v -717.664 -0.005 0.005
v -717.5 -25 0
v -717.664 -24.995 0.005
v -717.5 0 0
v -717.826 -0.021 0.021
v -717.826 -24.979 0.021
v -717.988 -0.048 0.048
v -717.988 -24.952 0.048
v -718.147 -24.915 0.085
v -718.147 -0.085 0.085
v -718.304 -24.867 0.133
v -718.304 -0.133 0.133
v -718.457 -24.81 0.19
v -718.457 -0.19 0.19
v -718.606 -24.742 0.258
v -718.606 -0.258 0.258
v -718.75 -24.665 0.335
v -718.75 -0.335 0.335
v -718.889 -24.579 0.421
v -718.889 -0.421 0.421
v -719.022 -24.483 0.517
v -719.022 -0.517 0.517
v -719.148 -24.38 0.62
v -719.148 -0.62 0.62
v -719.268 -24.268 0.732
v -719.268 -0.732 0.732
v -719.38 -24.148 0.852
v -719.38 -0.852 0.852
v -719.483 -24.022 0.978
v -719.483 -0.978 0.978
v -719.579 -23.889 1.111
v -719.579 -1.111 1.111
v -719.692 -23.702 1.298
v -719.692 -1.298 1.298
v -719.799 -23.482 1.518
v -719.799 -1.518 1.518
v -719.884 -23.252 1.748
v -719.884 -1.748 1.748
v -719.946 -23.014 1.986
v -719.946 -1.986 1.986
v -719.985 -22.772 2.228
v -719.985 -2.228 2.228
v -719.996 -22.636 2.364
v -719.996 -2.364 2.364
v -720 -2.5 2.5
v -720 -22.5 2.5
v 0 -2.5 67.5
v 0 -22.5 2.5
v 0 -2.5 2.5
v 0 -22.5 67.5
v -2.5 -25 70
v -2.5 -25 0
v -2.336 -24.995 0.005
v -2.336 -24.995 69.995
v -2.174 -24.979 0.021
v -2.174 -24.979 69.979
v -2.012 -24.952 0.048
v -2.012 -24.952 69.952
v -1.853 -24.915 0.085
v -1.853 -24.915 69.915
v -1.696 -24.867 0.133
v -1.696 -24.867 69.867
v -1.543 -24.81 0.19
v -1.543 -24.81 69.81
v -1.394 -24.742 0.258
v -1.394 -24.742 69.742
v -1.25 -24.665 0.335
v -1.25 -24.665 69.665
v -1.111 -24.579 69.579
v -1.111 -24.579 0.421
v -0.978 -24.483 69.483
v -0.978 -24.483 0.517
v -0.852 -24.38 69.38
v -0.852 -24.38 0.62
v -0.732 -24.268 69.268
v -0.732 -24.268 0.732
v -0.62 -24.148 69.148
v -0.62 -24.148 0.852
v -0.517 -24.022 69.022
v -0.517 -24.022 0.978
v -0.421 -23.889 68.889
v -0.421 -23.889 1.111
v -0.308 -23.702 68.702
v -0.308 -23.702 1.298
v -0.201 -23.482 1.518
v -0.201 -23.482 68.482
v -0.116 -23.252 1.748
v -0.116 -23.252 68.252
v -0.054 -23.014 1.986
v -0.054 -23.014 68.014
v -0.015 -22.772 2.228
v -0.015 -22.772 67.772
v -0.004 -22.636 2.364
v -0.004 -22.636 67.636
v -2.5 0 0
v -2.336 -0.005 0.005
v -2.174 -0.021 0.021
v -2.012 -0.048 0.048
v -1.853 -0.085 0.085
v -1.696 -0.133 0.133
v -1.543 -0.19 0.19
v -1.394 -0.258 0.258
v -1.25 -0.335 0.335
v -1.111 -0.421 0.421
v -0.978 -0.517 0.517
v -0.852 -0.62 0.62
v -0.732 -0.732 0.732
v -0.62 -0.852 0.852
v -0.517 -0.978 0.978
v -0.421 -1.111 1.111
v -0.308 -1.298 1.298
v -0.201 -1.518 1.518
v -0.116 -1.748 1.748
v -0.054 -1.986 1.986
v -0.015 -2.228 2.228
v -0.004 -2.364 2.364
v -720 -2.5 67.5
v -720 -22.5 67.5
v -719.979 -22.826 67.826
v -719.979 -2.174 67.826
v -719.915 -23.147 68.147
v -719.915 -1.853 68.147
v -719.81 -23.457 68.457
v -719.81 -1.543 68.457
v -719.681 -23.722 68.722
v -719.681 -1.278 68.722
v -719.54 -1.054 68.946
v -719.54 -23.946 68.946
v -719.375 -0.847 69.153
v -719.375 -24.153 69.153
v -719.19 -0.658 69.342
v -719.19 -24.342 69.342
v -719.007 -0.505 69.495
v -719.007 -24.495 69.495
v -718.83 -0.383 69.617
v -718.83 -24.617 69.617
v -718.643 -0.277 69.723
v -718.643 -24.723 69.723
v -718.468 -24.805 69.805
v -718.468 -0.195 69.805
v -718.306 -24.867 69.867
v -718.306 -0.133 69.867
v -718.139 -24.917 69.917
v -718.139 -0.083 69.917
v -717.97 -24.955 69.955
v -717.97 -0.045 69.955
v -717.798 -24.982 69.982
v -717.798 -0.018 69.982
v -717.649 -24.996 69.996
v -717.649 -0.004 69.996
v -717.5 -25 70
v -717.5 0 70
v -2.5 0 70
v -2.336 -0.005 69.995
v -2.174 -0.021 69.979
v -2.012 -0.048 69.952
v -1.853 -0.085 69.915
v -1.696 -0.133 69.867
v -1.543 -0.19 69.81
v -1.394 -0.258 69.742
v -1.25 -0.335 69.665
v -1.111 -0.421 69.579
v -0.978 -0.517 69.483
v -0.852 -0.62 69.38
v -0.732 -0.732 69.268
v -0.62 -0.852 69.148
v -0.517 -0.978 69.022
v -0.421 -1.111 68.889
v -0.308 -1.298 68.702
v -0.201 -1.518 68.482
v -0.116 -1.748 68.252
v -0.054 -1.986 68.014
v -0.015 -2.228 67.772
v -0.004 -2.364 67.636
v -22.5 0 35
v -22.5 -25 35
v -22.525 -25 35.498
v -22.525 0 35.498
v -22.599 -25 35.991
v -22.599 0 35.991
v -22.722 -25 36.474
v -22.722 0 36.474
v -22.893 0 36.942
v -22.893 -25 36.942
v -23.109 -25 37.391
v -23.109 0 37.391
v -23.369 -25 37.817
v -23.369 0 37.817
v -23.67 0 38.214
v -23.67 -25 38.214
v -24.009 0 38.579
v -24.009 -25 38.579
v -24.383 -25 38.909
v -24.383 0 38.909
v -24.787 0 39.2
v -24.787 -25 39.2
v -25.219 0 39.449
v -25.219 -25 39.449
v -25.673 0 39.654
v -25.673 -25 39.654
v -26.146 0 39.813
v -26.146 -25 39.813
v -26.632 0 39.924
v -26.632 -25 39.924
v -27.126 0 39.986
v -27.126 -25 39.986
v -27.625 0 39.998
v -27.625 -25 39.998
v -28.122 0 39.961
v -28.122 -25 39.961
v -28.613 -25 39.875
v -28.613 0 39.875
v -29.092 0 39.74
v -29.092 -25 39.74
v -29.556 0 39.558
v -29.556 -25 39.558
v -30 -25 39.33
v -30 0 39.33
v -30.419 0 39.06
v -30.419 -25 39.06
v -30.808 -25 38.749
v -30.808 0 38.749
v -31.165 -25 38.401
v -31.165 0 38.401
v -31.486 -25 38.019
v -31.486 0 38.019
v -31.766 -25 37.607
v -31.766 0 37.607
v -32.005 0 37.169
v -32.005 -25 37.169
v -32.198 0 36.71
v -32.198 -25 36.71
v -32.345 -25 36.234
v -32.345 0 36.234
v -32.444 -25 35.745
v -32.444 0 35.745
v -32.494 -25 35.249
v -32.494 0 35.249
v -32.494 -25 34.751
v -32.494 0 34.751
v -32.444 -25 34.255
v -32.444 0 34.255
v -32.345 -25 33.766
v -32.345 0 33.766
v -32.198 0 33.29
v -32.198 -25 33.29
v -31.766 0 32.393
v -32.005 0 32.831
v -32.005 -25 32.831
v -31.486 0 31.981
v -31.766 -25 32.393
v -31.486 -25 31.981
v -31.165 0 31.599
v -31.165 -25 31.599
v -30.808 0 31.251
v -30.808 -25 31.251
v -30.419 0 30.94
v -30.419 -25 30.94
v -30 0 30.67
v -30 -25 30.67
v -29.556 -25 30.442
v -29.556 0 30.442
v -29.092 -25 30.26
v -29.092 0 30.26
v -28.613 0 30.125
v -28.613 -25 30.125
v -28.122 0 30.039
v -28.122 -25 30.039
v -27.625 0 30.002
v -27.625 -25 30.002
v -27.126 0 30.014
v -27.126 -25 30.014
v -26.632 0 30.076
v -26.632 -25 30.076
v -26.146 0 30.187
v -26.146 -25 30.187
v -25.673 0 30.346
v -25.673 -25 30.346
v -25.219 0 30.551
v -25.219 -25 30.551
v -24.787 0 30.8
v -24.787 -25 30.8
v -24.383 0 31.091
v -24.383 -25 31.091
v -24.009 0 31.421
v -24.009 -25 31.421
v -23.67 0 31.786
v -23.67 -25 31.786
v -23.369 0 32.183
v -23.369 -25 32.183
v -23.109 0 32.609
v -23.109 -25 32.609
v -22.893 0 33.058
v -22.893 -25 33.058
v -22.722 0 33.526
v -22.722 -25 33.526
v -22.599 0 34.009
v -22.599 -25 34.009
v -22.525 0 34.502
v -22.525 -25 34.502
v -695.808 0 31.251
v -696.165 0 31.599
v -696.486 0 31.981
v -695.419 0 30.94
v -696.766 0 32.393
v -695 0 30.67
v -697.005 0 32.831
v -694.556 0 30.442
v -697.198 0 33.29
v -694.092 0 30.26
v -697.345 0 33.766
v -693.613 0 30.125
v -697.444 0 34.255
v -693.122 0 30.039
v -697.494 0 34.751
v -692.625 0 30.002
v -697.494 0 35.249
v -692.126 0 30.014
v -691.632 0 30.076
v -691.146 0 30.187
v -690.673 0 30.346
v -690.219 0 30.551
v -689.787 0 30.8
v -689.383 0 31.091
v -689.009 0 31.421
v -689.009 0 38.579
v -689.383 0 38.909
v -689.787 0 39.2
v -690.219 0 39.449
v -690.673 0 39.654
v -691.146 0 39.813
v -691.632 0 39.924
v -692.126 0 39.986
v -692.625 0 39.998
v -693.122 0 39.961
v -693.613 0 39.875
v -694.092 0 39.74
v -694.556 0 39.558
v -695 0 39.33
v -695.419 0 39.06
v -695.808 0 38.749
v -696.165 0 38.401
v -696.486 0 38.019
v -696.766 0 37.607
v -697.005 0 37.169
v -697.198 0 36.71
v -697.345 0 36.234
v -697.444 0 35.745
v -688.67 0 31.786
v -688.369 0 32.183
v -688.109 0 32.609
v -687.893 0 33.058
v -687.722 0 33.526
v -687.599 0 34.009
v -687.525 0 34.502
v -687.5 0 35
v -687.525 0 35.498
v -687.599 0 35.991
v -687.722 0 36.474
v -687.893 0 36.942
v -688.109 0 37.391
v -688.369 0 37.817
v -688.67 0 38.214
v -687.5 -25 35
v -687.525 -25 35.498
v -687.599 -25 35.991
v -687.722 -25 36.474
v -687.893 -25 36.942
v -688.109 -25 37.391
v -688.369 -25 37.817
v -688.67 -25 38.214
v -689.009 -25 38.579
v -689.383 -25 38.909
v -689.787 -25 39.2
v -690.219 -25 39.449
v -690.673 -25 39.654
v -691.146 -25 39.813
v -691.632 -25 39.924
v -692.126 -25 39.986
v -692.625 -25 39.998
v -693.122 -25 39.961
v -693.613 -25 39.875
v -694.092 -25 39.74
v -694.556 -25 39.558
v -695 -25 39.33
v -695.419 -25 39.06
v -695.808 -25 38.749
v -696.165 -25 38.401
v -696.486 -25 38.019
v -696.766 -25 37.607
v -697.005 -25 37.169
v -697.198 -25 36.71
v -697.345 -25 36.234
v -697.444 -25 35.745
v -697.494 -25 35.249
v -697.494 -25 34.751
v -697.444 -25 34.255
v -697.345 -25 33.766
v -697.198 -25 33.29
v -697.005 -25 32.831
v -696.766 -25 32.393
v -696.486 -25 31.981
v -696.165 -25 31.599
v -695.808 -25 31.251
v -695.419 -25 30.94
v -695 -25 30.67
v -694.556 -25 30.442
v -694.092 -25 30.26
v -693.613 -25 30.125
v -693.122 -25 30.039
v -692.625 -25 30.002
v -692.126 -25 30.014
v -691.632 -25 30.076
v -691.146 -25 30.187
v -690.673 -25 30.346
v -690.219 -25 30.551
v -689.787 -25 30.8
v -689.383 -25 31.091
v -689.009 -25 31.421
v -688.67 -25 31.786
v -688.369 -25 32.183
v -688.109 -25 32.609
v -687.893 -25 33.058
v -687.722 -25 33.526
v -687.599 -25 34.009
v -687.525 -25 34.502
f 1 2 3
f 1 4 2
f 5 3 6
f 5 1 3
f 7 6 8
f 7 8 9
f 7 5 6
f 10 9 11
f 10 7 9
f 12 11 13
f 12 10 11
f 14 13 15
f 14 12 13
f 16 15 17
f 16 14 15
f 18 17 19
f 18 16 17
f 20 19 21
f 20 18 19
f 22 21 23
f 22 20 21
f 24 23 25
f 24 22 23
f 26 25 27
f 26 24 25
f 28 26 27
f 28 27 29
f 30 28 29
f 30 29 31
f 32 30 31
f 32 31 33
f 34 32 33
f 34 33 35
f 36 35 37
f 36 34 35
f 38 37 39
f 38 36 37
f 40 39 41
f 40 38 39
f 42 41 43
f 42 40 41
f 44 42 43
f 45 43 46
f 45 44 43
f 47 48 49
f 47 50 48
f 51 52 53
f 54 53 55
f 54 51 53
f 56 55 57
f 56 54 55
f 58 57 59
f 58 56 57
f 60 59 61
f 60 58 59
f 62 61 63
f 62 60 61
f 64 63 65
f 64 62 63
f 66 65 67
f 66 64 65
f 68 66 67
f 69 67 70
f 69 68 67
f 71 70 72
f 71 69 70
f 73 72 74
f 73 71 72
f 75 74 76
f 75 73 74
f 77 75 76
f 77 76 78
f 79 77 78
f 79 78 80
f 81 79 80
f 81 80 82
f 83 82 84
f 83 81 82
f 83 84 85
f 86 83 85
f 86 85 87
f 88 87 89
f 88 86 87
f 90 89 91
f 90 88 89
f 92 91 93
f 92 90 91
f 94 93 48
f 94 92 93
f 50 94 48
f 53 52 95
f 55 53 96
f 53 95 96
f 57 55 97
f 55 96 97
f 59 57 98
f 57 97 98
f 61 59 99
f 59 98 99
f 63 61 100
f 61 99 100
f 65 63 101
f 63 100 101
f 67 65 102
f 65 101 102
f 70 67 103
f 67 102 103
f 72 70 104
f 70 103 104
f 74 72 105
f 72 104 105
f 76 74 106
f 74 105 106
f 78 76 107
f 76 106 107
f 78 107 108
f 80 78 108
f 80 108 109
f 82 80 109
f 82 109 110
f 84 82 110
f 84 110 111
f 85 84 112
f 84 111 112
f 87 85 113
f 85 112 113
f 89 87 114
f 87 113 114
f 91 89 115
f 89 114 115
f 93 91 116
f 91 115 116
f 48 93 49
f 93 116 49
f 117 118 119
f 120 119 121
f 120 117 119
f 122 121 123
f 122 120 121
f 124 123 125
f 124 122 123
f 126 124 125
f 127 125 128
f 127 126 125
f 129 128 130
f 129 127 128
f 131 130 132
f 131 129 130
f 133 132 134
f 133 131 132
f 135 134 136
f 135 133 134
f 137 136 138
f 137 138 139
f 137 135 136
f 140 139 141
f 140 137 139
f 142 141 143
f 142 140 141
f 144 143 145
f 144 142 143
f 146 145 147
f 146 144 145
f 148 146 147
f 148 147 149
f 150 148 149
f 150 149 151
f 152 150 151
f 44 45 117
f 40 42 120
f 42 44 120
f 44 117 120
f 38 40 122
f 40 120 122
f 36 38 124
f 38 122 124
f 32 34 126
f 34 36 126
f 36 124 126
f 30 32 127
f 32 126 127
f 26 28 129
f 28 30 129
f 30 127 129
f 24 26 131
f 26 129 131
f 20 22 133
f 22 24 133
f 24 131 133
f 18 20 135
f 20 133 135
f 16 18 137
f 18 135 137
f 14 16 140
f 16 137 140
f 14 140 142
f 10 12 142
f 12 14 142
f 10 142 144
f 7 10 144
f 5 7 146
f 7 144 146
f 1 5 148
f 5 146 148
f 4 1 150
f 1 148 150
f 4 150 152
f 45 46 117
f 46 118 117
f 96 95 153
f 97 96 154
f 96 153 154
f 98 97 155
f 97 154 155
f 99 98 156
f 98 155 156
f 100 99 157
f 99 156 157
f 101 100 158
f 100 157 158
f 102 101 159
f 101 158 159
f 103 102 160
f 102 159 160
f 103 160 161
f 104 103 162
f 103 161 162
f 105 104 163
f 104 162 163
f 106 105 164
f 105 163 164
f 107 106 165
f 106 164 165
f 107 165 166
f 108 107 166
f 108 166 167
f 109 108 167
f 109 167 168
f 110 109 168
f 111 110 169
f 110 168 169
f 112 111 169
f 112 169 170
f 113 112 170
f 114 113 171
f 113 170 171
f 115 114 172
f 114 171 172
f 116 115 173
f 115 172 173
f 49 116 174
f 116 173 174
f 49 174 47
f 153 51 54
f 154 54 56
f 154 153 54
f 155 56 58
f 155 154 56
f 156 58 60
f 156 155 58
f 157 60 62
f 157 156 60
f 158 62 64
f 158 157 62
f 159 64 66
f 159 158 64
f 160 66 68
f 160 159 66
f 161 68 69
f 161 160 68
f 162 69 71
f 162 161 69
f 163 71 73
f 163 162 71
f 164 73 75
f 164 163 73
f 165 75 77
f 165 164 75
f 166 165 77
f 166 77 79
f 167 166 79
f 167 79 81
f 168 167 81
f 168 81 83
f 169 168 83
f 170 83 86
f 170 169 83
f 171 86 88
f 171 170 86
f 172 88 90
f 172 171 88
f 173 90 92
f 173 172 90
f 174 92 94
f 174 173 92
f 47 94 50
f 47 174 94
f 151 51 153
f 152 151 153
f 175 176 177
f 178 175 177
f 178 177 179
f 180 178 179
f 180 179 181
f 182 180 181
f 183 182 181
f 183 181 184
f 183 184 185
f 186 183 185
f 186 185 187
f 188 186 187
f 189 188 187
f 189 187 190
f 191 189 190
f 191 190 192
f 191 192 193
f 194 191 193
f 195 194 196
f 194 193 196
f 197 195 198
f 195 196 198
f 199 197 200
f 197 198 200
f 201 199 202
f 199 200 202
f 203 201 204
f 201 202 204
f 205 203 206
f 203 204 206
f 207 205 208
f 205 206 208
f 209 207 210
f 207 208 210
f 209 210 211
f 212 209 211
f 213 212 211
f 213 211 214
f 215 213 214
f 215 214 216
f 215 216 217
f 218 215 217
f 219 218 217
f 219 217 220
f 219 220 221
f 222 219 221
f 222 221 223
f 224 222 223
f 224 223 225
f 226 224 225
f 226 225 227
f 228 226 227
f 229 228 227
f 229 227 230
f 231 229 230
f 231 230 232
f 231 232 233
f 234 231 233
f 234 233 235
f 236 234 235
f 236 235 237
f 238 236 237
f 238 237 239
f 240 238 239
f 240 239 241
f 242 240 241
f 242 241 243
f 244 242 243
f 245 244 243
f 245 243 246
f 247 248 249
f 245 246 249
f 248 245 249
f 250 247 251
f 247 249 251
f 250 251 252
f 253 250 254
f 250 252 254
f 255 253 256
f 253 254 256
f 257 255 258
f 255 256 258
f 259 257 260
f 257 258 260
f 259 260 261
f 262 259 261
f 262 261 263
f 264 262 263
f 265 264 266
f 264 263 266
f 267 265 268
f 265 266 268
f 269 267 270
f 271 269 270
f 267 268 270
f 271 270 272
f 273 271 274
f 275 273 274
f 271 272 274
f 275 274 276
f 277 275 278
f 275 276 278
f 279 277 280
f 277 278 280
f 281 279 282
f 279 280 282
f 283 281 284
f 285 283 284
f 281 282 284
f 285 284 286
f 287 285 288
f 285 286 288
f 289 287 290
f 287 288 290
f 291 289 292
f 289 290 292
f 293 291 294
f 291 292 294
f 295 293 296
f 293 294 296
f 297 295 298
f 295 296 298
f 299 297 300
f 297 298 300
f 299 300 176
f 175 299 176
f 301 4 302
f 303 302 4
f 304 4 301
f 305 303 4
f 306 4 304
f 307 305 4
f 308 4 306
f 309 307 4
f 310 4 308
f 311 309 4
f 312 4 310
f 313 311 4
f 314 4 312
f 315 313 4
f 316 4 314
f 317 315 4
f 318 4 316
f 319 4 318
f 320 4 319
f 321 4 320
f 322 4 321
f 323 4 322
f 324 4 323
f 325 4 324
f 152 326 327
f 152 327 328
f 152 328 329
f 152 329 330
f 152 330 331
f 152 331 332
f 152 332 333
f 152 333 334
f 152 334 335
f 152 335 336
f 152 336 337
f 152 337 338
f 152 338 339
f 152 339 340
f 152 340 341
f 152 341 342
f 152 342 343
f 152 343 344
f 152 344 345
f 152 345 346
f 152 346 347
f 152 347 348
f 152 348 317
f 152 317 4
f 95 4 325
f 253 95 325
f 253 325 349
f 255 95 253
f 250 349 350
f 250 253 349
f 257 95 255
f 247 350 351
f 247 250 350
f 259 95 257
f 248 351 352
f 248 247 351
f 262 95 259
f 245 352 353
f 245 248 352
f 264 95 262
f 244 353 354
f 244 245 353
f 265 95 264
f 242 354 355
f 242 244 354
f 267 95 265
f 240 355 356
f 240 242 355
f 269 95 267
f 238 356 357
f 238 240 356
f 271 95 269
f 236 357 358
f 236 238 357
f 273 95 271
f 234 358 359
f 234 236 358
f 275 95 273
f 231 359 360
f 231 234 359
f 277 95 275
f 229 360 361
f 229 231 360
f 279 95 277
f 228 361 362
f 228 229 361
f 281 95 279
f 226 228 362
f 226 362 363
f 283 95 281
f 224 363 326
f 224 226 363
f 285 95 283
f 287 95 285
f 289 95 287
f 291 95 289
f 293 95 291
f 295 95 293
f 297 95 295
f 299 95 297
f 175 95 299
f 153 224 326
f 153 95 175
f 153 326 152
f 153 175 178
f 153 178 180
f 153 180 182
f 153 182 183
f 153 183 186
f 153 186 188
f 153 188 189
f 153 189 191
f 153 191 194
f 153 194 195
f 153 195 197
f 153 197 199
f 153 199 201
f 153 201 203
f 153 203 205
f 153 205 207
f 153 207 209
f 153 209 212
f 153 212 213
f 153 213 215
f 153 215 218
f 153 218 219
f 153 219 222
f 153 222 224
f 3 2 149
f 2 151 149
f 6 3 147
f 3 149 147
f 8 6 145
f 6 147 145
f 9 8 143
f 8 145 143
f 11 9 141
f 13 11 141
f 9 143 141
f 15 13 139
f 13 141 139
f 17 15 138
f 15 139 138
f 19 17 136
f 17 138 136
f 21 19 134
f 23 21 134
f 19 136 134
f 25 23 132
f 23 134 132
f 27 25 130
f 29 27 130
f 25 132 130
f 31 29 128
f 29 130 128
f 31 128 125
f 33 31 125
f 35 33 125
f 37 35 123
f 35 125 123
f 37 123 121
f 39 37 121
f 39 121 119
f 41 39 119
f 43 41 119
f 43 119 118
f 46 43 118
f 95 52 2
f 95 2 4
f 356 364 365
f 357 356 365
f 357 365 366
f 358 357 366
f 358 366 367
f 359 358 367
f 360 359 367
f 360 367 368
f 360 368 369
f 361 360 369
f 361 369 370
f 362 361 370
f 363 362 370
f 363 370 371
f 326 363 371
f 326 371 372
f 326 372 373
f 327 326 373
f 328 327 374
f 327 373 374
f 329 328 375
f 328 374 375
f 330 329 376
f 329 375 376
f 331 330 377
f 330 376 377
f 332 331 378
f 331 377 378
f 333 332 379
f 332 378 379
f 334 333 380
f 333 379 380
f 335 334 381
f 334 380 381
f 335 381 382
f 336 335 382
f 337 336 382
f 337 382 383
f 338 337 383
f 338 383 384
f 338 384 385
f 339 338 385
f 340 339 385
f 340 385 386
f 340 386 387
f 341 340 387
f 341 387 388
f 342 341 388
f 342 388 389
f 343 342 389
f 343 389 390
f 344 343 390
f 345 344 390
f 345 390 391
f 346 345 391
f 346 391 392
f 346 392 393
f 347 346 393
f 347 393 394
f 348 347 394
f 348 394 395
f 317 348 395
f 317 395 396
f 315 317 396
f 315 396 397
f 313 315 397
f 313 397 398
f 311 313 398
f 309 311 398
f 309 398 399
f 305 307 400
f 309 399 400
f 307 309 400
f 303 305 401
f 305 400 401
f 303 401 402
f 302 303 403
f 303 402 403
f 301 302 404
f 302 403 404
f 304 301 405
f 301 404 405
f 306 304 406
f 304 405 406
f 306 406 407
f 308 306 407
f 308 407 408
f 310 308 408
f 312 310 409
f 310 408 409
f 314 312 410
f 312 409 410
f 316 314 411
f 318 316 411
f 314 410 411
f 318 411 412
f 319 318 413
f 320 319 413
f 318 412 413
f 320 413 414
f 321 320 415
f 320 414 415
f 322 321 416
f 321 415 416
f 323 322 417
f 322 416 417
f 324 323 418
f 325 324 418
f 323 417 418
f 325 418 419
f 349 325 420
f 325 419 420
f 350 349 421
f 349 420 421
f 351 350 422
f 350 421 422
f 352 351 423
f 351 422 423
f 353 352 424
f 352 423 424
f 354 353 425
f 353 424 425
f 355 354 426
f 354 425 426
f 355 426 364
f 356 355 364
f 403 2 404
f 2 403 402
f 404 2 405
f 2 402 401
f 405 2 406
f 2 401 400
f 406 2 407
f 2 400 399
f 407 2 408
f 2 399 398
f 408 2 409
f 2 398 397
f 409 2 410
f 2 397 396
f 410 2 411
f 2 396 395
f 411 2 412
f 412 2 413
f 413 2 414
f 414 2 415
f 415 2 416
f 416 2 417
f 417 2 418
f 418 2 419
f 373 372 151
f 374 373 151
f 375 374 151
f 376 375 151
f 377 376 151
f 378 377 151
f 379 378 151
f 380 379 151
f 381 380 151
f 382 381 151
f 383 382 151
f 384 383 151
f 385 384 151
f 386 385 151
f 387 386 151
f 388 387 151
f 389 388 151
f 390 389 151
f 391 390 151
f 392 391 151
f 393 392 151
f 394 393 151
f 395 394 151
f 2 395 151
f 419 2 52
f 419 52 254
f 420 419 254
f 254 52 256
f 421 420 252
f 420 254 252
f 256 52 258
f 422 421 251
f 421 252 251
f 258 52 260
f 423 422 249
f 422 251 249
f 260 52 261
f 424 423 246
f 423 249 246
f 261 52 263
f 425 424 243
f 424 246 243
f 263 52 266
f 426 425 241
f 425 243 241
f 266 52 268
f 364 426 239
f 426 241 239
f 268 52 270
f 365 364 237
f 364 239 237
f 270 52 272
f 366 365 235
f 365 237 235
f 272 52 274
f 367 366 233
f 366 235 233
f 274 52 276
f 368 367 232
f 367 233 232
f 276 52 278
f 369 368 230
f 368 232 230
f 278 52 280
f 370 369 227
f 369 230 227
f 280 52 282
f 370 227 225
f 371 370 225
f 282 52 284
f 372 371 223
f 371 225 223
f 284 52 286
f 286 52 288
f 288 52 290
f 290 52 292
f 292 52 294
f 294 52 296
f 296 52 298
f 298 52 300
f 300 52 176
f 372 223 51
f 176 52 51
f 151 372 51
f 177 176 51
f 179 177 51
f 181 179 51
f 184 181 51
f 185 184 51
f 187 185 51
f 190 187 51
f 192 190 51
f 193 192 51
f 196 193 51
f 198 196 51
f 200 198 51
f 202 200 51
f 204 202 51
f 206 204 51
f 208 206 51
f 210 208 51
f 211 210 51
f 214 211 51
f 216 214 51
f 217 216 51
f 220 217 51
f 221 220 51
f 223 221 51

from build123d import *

# Parameters (mm, degrees)
F0_W     = 25
F0_H     = 70
F1_DEPTH = 720
F2_R     = 2.5
F3_R     = 2.5
F4_R     = 5
F5_DEPTH = 25.001


with BuildPart() as f1:
    # F0 (on Right) → F1 (new body)
    with BuildSketch(Plane.YZ):
        with Locations((-12.5, 35)):
            Rectangle(F0_W, F0_H)
    extrude(amount=-F1_DEPTH)

    # F2
    f2_edges = [f1.edges().sort_by_distance(p)[0] for p in [
        (0, -12.5, 0),
        (0, 0, 35),
        (0, -12.5, 70),
        (0, -25, 35),
    ]]
    fillet(f2_edges, radius=F2_R)

    # F3
    f3_edges = [f1.edges().sort_by_distance(p)[0] for p in [
        (-720, -12.5, 0),
        (-720, 0, 35),
        (-720, -12.5, 70),
        (-720, -25, 35),
    ]]
    fillet(f3_edges, radius=F3_R)

    # F4 (on face) → F5 (cut, through all)
    with BuildSketch(Plane.XZ.offset(25)):
        with Locations((-692.5, 35)):
            Circle(F4_R)
        with Locations((-27.5, 35)):
            Circle(F4_R)
    extrude(amount=-F5_DEPTH, mode=Mode.SUBTRACT)


solid = f1.part
